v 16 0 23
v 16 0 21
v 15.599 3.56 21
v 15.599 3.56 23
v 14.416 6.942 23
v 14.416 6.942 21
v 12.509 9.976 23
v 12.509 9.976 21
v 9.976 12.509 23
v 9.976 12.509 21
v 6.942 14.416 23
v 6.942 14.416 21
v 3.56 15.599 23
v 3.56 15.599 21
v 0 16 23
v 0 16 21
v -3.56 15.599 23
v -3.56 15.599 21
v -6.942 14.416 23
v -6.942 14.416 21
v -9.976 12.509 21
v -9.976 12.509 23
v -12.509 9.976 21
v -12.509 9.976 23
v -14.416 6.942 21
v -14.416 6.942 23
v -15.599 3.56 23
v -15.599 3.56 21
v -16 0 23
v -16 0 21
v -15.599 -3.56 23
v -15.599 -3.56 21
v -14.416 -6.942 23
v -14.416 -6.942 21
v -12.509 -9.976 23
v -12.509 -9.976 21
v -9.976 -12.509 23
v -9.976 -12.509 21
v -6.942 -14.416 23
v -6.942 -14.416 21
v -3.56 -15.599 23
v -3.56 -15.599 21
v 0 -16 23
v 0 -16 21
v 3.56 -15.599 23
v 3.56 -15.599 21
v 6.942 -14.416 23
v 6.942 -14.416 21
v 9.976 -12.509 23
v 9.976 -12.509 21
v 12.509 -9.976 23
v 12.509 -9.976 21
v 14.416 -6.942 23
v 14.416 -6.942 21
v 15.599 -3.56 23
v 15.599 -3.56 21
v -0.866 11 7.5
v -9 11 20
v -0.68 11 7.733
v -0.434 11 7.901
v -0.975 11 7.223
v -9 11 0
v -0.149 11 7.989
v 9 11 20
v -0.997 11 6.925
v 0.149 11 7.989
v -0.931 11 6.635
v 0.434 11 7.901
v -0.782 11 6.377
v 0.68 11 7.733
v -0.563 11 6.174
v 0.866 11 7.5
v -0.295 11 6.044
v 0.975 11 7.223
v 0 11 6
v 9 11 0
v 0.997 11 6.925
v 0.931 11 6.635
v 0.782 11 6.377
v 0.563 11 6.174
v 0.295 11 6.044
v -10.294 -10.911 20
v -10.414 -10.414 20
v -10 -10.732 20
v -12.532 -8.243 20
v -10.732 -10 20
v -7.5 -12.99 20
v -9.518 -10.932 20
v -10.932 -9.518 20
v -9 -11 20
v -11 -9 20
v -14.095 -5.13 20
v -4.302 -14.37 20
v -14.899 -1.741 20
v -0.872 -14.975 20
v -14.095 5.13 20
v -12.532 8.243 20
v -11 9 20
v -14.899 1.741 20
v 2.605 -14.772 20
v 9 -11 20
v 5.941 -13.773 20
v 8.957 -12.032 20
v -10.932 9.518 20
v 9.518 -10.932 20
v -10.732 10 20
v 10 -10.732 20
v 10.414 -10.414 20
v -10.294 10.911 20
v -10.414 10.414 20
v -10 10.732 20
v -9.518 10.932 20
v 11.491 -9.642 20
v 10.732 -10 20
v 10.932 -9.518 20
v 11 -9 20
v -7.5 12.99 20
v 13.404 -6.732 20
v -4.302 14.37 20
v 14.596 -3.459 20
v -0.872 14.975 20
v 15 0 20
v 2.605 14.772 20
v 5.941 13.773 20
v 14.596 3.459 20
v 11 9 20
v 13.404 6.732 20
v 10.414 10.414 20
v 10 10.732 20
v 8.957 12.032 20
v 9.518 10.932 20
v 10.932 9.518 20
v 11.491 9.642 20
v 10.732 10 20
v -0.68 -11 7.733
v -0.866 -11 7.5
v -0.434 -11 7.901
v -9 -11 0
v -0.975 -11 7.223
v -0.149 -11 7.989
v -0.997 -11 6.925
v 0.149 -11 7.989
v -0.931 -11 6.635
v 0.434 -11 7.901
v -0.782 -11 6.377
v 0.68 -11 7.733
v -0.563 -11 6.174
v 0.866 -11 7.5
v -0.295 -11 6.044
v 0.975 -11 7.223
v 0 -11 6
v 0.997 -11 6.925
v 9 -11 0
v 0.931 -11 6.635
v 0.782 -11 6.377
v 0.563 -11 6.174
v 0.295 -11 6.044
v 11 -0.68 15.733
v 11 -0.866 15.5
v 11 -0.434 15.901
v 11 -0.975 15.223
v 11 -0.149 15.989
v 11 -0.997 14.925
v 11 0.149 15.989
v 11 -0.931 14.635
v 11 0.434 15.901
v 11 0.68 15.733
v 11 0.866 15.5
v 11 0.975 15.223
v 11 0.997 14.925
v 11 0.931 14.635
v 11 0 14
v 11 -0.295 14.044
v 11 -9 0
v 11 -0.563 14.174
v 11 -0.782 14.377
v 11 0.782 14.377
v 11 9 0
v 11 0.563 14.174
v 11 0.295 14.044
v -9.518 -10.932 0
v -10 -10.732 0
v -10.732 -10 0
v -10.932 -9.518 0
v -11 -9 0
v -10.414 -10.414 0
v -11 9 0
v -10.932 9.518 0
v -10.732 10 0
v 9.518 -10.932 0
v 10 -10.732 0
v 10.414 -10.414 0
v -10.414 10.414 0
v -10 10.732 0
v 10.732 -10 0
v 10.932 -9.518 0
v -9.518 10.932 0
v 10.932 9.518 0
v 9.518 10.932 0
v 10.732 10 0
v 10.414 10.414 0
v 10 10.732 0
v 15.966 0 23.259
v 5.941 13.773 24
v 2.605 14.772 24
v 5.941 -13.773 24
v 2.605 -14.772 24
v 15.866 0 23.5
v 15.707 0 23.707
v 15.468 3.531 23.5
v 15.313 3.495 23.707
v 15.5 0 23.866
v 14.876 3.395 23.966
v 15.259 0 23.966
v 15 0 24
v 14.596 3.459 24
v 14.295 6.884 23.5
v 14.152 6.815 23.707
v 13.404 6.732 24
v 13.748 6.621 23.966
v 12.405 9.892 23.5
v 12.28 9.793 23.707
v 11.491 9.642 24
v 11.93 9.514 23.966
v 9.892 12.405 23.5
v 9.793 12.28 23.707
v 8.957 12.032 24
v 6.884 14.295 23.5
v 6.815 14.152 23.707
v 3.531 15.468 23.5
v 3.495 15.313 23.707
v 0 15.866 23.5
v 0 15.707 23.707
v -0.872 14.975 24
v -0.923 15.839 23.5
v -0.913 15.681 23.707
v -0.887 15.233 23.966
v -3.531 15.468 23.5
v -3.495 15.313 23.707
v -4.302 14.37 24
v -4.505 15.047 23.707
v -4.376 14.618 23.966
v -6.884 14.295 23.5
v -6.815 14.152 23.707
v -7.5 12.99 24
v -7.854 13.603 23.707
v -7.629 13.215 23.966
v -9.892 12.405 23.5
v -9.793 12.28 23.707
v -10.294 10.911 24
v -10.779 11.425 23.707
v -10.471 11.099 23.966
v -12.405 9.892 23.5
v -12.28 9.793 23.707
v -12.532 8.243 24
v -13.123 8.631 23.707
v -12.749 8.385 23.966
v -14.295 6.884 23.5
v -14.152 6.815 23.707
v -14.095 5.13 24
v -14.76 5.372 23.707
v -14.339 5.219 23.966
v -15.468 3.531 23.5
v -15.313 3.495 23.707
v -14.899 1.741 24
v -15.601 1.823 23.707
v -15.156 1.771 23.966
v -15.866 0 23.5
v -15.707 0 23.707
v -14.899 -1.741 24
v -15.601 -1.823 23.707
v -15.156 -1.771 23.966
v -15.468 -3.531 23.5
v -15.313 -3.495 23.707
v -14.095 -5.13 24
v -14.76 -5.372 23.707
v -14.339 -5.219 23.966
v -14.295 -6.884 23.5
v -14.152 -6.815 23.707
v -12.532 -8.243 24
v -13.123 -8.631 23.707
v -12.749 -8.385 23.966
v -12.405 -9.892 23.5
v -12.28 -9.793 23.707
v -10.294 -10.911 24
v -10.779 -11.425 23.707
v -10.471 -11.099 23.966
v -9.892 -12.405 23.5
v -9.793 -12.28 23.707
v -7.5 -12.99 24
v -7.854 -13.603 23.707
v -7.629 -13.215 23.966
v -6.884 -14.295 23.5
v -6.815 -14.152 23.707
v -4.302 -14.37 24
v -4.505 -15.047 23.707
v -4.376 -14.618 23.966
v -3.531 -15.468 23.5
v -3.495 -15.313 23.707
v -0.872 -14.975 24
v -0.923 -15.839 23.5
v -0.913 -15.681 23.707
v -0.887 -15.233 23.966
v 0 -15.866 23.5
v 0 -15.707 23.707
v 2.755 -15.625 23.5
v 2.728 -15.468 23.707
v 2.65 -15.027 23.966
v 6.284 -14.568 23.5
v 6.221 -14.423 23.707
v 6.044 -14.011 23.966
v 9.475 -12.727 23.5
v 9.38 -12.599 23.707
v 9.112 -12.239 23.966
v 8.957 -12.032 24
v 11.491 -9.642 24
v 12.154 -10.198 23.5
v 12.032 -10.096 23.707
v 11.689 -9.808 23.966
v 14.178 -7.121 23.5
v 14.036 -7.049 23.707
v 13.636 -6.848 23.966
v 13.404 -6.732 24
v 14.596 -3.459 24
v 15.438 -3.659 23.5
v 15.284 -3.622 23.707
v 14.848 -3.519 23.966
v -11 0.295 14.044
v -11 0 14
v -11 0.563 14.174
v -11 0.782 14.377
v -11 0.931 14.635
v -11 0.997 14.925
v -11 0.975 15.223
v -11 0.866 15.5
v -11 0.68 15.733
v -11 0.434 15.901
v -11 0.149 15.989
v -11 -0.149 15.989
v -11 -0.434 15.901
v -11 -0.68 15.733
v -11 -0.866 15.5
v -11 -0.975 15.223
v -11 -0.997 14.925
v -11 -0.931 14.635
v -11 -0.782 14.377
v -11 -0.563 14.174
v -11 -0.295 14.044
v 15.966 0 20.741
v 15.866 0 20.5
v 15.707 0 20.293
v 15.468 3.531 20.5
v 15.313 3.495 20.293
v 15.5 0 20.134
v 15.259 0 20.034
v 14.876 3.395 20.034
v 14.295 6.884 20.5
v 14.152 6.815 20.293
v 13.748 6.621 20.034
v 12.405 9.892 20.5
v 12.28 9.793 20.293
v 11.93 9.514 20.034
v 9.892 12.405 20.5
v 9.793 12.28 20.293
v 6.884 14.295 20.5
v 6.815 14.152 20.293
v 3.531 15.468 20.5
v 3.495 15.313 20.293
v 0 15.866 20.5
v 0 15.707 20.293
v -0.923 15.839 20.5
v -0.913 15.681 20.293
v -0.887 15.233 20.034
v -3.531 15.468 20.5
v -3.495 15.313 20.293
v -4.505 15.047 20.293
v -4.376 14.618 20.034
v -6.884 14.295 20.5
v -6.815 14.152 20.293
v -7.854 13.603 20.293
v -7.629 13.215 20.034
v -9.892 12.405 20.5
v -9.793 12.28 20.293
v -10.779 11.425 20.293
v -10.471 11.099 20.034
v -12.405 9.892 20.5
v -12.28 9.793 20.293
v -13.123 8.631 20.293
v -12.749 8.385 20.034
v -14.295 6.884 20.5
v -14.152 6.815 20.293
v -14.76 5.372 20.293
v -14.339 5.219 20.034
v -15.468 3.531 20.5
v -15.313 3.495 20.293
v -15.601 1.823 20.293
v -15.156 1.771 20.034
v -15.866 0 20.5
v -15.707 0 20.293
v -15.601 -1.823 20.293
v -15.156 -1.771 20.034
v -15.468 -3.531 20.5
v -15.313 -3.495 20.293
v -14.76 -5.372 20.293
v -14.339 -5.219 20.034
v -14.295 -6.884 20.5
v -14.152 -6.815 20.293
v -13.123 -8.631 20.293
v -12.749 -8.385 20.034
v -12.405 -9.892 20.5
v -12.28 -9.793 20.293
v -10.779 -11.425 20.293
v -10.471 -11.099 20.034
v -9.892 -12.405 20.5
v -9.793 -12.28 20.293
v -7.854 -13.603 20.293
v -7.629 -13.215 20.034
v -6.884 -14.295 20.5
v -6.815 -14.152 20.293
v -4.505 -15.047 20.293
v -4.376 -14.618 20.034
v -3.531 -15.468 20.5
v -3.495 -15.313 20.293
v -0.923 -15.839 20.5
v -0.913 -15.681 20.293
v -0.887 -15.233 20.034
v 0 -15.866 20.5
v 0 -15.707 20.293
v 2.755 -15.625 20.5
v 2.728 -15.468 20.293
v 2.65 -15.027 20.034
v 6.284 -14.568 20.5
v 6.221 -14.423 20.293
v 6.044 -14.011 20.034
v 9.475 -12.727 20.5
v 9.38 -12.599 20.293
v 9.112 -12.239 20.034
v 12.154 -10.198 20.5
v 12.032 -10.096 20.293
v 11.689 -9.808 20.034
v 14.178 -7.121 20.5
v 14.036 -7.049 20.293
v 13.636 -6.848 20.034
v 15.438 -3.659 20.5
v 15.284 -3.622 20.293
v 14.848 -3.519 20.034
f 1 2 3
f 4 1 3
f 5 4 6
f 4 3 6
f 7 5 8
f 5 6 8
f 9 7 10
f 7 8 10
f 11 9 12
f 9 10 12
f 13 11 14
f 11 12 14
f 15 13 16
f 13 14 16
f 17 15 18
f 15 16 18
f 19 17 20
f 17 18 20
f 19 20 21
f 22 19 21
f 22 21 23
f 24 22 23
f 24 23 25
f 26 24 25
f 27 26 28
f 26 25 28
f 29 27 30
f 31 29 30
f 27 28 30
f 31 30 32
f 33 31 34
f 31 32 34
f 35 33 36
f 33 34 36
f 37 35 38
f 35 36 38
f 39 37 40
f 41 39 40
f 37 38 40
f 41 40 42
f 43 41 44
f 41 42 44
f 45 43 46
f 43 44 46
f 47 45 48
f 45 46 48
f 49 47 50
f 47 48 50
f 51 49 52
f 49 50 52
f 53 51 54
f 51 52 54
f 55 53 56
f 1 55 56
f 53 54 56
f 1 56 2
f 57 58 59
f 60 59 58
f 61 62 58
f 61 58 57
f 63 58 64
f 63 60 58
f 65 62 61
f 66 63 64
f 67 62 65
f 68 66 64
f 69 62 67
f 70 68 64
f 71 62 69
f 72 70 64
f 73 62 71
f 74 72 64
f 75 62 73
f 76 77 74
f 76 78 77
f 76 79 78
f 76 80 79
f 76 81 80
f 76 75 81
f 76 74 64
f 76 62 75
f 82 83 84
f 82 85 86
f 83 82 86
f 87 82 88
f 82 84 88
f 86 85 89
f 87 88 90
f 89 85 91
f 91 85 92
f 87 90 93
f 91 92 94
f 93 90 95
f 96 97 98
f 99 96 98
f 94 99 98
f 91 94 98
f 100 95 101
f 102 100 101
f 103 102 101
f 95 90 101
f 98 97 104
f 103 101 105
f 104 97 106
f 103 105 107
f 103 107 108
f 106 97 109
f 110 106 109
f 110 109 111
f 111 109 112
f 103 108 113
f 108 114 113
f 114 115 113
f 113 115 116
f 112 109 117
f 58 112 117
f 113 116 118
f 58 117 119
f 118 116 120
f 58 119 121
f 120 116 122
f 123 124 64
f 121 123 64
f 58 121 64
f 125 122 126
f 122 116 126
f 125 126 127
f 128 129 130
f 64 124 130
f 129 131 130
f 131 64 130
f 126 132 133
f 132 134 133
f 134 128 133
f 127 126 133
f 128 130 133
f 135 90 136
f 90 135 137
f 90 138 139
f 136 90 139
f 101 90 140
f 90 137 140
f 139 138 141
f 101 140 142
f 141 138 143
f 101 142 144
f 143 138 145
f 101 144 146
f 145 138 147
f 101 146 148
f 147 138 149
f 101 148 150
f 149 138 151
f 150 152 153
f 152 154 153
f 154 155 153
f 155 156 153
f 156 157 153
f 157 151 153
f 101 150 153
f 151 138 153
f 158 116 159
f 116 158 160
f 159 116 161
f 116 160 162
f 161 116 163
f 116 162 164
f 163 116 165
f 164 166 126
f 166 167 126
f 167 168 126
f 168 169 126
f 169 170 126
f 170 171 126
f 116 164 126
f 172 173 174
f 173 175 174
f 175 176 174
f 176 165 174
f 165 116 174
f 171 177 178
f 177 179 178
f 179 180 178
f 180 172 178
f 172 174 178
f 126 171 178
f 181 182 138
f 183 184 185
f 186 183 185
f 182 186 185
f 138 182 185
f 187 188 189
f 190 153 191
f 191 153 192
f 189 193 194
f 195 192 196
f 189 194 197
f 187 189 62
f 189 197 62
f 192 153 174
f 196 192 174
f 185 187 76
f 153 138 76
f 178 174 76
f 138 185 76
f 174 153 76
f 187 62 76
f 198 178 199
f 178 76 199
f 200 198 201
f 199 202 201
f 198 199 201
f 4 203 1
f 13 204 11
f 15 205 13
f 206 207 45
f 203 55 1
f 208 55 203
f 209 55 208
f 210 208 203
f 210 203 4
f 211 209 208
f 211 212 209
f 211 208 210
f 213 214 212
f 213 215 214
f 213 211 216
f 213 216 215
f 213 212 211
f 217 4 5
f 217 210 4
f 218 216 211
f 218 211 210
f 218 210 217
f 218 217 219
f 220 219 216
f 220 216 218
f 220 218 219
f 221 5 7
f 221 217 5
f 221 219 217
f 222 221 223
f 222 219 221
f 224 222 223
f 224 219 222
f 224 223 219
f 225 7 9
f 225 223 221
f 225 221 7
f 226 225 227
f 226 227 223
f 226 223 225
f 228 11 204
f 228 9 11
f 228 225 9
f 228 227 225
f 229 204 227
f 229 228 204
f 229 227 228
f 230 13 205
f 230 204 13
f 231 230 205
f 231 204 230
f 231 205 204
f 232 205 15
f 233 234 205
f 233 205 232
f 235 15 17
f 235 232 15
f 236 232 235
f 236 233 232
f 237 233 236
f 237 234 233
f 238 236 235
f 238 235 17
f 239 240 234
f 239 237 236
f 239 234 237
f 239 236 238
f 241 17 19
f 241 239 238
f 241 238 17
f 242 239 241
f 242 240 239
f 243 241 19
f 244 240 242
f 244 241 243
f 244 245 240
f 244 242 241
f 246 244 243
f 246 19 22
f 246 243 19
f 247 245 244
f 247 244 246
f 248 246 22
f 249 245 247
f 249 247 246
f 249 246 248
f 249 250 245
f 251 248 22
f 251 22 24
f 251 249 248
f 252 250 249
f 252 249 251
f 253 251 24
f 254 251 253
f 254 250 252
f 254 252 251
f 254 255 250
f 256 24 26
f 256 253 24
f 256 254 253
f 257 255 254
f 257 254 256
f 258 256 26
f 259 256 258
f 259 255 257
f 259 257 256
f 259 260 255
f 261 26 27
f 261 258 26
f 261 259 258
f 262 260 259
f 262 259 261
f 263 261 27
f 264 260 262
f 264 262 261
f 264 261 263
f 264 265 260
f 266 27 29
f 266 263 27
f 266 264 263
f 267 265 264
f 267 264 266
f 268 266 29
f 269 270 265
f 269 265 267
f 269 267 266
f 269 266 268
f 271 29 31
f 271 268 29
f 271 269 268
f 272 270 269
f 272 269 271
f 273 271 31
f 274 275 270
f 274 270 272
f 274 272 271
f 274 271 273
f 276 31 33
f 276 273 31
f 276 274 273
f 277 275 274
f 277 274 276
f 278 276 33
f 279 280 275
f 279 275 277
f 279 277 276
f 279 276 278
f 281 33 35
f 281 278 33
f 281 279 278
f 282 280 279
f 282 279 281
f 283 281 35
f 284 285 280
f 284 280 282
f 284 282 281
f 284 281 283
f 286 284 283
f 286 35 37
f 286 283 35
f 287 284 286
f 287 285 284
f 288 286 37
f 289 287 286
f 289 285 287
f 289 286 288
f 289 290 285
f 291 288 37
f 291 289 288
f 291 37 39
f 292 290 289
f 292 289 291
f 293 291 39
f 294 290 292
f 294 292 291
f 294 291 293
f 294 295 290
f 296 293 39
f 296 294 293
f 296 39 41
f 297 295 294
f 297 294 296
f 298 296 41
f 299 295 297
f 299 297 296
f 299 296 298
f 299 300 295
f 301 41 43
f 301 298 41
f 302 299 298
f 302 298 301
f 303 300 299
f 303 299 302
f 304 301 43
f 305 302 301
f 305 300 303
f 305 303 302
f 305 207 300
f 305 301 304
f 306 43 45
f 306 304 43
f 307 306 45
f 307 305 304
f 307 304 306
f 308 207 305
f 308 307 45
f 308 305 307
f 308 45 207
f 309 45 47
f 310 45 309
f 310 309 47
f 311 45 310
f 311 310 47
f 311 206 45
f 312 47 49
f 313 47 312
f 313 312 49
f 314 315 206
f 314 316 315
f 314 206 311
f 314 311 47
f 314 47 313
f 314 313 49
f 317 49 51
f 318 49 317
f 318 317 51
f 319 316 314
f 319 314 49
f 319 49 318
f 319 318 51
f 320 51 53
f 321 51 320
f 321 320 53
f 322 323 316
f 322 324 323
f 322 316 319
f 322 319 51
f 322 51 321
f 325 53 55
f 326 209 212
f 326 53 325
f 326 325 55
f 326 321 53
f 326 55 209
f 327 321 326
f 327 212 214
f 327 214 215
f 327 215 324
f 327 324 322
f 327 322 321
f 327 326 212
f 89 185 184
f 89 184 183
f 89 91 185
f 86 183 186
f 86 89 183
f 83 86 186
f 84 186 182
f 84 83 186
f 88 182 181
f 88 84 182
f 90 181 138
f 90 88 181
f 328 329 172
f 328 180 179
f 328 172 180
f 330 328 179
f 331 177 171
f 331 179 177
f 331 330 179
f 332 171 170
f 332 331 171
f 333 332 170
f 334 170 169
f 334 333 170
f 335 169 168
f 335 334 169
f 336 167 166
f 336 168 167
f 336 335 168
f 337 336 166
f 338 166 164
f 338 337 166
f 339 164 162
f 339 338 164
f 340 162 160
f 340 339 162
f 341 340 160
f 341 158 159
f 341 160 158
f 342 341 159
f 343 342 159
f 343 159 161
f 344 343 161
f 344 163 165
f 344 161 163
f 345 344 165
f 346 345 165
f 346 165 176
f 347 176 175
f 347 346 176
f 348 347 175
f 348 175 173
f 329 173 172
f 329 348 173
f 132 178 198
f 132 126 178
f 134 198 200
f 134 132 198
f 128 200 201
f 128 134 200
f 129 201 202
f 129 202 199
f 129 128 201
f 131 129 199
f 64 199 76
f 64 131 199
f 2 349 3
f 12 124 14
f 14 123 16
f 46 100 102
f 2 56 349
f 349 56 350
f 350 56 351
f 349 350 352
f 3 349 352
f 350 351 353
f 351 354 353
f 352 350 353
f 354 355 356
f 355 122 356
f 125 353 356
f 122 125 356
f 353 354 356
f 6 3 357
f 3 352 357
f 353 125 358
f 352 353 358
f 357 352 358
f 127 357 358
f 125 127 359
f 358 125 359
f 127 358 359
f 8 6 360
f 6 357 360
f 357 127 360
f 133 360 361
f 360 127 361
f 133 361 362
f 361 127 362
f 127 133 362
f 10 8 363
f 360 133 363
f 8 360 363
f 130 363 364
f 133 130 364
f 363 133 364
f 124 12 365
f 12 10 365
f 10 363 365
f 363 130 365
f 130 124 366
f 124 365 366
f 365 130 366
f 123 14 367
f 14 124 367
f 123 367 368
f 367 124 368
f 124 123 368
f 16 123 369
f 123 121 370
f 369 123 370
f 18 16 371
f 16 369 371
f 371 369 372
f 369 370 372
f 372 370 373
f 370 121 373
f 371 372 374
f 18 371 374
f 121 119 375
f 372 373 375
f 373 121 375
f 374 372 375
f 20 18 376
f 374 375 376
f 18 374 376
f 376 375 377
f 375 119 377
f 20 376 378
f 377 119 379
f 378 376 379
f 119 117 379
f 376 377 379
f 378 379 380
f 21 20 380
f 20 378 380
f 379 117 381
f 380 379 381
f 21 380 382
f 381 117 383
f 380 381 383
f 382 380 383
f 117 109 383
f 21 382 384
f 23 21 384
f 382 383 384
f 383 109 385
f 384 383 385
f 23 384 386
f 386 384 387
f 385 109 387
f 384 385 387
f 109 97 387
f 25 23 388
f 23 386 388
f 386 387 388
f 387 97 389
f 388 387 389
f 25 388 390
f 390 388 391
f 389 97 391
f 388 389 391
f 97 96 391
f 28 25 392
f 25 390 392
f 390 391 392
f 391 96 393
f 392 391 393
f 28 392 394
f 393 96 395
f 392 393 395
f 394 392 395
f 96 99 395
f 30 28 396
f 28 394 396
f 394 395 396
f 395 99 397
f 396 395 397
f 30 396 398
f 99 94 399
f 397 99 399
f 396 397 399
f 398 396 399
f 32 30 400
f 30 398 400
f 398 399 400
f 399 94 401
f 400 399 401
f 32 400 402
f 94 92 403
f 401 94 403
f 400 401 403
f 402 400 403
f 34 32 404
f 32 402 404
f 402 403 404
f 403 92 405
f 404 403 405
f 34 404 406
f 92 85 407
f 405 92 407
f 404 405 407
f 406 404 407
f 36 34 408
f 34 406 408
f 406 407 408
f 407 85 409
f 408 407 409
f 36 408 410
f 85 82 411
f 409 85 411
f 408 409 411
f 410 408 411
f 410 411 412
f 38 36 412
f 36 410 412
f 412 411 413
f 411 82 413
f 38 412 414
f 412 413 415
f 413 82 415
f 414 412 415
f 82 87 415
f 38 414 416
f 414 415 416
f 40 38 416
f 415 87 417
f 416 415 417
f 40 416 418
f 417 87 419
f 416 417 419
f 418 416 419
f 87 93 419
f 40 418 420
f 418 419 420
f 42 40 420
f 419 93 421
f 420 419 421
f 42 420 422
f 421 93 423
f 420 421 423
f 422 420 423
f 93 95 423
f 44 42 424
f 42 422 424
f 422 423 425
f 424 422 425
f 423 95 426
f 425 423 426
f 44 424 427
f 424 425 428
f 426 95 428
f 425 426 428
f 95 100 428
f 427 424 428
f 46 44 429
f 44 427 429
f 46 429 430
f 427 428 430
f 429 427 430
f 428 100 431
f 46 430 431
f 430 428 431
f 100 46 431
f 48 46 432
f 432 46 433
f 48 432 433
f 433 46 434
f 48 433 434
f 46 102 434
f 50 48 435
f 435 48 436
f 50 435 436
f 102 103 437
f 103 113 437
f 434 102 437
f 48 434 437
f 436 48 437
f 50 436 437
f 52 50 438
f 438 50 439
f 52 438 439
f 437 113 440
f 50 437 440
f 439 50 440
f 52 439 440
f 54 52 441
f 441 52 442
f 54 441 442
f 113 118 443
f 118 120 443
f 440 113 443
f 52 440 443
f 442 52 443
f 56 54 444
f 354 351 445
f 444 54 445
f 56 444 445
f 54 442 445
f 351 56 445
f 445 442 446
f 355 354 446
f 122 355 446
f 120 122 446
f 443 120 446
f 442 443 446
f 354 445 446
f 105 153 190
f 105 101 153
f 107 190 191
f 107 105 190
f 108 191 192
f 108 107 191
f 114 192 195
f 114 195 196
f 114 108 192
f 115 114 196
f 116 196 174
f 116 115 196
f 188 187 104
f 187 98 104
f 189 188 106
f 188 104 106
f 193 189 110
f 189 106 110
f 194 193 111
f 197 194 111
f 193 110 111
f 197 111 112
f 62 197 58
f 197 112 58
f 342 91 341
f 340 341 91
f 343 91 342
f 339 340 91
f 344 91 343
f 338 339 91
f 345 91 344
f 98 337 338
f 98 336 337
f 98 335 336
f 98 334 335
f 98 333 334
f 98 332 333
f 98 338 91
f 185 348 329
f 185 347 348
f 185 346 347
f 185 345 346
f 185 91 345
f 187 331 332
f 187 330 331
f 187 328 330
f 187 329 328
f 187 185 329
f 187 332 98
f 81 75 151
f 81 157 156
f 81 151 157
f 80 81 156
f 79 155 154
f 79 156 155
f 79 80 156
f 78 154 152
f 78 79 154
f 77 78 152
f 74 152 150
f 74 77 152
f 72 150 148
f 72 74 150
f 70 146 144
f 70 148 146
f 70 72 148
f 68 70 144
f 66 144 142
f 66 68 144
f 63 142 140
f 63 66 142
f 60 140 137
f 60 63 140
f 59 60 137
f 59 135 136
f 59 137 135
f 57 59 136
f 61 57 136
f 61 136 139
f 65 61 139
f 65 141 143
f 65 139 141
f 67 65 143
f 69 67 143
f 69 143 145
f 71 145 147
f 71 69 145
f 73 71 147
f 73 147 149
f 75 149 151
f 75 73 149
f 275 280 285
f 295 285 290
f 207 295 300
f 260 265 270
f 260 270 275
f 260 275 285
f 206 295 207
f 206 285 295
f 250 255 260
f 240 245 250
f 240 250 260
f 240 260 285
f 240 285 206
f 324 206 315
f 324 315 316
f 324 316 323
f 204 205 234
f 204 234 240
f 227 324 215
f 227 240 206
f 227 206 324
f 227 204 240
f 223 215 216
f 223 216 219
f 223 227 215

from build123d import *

# Parameters (mm, degrees)
CYLINDER019_R     = 1
CYLINDER019_DEPTH = 40
CYLINDER018_R     = 1
CYLINDER018_DEPTH = 40
BOX011_W          = 22
BOX011_H          = 22
BOX011_DEPTH      = 20
FILLET004_R       = 2
CYLINDER017_R     = 16
CYLINDER017_DEPTH = 4
FILLET003_R       = 1


with BuildPart() as screw_hole_cylinder003:
    # Cylinder019 → Cylinder019 (new body)
    with BuildSketch(Plane(origin=(0, 20, 7), x_dir=(0, 0, -1), z_dir=(0, -1, 0))):
        Circle(CYLINDER019_R)
    extrude(amount=CYLINDER019_DEPTH)


with BuildPart() as tope_screw_hole_fusion:
    # Cylinder018 → Cylinder018 (new body)
    with BuildSketch(Plane(origin=(-20, 0, 15), x_dir=(0, 0, -1), z_dir=(1, 0, 0))):
        Circle(CYLINDER018_R)
    extrude(amount=CYLINDER018_DEPTH)

    # Fusion018: union screw hole cylinder003
    add(screw_hole_cylinder003.part)


with BuildPart() as fillet004:
    # Box011 → Box011 (new body)
    with BuildSketch(Plane(origin=(-11, -11, 0), x_dir=(1, 0, 0), z_dir=(0, 0, 1))):
        with Locations((11, 11)):
            Rectangle(BOX011_W, BOX011_H)
    extrude(amount=BOX011_DEPTH)

    # Fillet004
    fillet004_edges = [fillet004.edges().sort_by_distance(p)[0] for p in [
        (-11, -11, 10),
        (-11, 11, 10),
        (11, -11, 10),
        (11, 11, 10),
    ]]
    fillet(fillet004_edges, radius=FILLET004_R)


with BuildPart() as top_cut:
    # Cylinder017 → Cylinder017 (new body)
    with BuildSketch(Plane.XY.offset(20)):
        Circle(CYLINDER017_R)
    extrude(amount=CYLINDER017_DEPTH)

    # Fillet003
    fillet003_edges = [top_cut.edges().sort_by_distance(p)[0] for p in [
        (-16, 0, 24),
        (-16, 0, 20),
    ]]
    fillet(fillet003_edges, radius=FILLET003_R)

    # Fusion017: union Fillet004
    add(fillet004.part)

    # Cut005: cut tope screw hole fusion
    add(tope_screw_hole_fusion.part, mode=Mode.SUBTRACT)


solid = top_cut.part
